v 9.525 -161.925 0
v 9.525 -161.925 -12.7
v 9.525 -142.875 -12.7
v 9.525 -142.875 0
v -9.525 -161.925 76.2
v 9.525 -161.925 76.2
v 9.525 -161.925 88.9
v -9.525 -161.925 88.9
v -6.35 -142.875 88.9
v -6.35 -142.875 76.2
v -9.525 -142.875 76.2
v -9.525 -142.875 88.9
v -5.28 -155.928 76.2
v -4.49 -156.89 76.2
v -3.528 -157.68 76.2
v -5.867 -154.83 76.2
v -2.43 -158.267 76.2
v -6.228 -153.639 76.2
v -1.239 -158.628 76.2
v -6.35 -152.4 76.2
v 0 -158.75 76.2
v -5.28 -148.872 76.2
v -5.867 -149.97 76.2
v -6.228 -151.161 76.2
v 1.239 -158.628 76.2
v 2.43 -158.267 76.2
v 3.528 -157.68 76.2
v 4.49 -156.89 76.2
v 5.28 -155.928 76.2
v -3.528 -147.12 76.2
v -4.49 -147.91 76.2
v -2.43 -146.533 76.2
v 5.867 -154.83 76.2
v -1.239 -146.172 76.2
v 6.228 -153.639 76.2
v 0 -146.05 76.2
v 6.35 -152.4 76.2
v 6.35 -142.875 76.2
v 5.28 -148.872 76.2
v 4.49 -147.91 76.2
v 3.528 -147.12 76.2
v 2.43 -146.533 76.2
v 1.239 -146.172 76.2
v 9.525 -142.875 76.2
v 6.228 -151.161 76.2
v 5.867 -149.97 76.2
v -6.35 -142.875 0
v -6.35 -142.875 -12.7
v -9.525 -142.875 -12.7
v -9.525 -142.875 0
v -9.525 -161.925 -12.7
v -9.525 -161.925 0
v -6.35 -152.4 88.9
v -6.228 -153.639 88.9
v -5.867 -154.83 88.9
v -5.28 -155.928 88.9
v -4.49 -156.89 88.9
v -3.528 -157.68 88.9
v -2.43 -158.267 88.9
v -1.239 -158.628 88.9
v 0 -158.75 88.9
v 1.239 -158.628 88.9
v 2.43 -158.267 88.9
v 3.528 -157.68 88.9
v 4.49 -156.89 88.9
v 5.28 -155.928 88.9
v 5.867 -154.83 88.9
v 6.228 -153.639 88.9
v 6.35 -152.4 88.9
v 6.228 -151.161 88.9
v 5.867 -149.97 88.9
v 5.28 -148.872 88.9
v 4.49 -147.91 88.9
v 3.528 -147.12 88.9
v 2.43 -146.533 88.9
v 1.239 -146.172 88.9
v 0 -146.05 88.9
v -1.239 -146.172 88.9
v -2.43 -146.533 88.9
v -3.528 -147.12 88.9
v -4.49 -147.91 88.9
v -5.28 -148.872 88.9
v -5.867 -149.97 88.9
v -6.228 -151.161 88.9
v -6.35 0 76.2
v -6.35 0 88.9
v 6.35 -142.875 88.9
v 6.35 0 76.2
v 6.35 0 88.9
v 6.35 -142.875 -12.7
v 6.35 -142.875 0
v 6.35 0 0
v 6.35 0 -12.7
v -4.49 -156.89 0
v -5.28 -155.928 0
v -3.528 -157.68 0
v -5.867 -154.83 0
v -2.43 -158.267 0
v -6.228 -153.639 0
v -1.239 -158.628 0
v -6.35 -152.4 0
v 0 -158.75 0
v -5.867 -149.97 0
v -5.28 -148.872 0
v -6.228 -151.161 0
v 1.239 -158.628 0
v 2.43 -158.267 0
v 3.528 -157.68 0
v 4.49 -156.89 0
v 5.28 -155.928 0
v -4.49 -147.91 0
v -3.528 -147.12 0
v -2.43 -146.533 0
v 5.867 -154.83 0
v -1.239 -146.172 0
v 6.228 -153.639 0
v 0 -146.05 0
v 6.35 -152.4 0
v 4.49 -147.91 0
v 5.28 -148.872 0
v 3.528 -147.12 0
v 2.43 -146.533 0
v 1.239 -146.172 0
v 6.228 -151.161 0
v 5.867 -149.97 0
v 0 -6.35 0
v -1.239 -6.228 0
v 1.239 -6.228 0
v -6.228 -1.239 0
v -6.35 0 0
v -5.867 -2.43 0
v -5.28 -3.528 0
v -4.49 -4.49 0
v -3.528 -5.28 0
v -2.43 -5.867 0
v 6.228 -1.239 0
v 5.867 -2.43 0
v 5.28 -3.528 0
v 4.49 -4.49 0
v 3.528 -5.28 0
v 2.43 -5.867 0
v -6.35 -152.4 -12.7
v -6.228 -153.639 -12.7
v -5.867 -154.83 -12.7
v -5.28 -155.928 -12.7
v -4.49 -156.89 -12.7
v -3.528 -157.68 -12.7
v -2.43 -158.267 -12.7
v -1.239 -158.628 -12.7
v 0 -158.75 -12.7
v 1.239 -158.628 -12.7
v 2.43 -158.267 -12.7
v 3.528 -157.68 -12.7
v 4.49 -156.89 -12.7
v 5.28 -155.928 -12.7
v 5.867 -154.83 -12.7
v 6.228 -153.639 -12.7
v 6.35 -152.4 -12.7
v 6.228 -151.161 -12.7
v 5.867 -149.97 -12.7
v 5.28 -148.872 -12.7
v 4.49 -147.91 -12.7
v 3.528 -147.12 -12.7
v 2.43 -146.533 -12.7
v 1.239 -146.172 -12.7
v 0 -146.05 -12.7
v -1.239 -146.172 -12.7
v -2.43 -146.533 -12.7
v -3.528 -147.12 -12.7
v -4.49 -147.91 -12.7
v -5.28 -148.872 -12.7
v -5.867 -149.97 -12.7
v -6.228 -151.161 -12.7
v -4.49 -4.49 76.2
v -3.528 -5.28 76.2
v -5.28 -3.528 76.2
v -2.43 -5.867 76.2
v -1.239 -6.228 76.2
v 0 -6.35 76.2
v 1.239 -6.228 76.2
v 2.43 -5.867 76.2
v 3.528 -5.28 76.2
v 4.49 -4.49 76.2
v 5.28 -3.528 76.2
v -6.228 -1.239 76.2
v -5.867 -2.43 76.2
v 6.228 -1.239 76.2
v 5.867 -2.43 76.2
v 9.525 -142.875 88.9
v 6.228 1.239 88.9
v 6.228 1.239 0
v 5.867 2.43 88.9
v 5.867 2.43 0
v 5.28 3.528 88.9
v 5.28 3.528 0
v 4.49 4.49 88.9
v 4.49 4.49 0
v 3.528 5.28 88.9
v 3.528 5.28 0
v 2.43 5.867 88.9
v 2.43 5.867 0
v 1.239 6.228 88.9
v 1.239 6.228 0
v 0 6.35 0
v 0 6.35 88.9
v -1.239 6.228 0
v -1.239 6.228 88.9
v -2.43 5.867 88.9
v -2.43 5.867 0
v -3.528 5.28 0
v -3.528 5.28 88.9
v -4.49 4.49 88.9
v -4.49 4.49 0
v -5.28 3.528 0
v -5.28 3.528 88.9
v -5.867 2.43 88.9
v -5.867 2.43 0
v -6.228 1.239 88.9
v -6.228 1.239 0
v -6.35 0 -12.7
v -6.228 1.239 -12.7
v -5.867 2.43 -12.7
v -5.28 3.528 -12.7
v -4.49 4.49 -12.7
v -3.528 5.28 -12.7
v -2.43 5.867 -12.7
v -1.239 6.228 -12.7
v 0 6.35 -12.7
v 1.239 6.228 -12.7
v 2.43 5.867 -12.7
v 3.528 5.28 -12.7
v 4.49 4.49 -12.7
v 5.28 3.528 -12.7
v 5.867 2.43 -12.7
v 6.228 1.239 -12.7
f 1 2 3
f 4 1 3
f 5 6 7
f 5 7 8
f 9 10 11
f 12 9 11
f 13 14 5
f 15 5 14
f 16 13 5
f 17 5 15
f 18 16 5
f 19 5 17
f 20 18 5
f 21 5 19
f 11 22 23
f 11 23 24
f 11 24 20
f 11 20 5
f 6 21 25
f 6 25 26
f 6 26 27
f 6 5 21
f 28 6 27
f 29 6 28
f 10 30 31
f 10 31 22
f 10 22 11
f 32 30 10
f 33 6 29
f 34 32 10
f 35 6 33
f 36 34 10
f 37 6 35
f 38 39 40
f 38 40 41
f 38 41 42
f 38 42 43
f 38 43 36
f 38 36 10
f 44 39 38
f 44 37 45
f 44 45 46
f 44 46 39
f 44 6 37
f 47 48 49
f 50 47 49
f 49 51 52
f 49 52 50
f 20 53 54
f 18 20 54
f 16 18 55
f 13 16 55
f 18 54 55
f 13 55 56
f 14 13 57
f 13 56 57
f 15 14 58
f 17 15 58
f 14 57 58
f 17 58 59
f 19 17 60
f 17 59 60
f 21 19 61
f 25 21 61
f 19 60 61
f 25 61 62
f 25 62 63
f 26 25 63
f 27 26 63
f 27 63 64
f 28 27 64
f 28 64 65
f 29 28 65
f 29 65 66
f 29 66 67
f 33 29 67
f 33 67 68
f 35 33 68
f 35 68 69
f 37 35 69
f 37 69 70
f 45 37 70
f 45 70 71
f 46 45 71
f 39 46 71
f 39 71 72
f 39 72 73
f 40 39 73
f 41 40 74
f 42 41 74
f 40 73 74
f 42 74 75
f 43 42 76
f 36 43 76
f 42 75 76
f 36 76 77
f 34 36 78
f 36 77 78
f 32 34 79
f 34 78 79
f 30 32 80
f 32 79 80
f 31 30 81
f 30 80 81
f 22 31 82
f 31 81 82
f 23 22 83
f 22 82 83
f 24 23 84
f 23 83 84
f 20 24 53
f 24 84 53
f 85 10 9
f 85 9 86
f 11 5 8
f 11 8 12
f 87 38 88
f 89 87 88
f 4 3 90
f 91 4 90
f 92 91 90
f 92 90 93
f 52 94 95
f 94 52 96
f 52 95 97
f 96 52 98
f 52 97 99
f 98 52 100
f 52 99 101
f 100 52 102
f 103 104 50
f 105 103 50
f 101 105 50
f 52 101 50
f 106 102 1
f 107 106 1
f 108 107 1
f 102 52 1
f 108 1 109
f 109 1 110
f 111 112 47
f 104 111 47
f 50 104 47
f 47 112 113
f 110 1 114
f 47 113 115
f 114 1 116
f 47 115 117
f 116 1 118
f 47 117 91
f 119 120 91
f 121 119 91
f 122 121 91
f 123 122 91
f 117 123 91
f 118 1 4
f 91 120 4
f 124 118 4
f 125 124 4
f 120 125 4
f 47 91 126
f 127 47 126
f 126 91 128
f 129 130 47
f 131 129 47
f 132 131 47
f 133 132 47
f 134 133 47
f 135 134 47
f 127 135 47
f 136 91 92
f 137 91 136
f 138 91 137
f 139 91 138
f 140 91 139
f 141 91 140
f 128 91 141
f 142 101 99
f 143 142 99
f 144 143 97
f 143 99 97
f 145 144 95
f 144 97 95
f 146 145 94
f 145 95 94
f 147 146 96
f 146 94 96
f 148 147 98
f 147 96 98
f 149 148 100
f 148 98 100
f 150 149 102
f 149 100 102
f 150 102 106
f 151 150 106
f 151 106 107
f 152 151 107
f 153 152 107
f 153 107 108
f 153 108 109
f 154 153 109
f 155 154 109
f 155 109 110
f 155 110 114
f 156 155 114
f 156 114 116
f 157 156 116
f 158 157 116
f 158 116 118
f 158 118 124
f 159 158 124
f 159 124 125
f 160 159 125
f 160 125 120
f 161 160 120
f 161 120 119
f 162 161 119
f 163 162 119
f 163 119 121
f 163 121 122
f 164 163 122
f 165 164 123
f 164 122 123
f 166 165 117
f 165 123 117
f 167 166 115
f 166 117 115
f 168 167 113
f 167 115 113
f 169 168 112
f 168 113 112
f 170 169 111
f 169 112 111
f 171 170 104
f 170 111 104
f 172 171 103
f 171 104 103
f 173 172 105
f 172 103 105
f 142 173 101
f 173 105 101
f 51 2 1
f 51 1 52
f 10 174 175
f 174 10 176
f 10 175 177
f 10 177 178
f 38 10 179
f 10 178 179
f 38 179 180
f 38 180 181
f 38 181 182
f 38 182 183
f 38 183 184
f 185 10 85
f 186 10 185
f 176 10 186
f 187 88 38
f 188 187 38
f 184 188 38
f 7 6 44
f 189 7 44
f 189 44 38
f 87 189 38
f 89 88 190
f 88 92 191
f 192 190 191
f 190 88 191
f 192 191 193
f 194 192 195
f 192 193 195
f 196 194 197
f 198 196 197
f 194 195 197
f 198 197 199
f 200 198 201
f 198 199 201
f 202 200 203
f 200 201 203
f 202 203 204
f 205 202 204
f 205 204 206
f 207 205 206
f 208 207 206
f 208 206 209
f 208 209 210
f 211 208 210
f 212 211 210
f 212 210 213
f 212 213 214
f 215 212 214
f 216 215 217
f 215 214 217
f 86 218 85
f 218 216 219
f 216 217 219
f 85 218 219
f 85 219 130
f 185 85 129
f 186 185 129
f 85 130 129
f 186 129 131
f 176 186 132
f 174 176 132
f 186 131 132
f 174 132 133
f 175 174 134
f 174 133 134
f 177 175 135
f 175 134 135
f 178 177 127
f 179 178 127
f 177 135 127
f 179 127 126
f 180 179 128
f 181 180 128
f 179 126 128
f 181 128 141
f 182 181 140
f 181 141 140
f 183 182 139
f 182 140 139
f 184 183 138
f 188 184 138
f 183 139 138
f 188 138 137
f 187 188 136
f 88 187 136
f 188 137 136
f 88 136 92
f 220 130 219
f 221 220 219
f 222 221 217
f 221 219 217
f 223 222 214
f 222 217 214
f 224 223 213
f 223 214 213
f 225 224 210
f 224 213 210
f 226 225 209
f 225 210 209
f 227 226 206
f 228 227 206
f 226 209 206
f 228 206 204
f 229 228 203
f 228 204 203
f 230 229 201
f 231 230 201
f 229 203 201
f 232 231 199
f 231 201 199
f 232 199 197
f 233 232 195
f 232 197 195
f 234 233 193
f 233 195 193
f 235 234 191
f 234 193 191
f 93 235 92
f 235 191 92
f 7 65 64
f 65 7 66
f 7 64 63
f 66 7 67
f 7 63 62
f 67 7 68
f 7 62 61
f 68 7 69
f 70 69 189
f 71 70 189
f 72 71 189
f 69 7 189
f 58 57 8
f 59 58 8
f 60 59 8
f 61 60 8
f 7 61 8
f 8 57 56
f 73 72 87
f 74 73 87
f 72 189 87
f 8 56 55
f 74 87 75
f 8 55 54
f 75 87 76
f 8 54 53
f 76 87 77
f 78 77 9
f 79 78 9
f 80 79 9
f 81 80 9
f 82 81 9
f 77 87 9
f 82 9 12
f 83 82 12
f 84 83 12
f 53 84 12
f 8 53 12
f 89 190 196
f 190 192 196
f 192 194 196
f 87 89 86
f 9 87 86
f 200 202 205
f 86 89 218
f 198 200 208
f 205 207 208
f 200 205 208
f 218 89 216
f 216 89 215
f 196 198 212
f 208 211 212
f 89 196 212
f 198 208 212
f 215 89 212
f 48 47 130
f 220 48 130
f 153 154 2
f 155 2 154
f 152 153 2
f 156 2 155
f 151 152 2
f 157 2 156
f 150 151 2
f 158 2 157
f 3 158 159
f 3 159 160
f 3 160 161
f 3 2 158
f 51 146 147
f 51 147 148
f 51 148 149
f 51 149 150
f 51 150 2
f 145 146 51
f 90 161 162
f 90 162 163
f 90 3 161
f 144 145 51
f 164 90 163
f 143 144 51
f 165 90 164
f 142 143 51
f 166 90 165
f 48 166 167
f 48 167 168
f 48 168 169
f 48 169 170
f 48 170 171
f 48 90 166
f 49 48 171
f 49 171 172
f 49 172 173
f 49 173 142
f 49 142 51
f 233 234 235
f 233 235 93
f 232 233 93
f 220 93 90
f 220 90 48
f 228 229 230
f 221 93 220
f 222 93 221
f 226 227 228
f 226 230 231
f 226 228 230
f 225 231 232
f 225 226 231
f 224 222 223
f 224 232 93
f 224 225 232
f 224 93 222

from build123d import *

# Parameters (mm, degrees)
SKETCH2_R           = 6.35
BOSS_EXTRUDE1_DEPTH = 76.2
SKETCH3_W           = 12.7
SKETCH3_H           = 152.4
BOSS_EXTRUDE2_DEPTH = 12.7
BOSS_EXTRUDE3_DEPTH = 12.7
SKETCH6_W           = 12.7
SKETCH6_H           = 152.4
BOSS_EXTRUDE4_DEPTH = 12.7
BOSS_EXTRUDE5_DEPTH = 12.7
SKETCH8_W           = 19.05
SKETCH8_H           = 19.05
BOSS_EXTRUDE6_DEPTH = 101.6
SKETCH9_W           = 76.2
SKETCH9_H           = 29.319846112
CUT_EXTRUDE1_DEPTH  = 198.12
CUT_EXTRUDE2_DEPTH  = 102.6


with BuildPart() as part:
    # Sketch2 → Boss-Extrude1 (new body)
    with BuildSketch(Plane.XY):
        Circle(SKETCH2_R)
    extrude(amount=BOSS_EXTRUDE1_DEPTH)

    # Sketch3 → Boss-Extrude2 (add)
    with BuildSketch(Plane.XY.offset(76.2)):
        with Locations((0, -76.2)):
            Rectangle(SKETCH3_W, SKETCH3_H)
    extrude(amount=BOSS_EXTRUDE2_DEPTH)

    # Sketch4 → Boss-Extrude3 (add)
    with BuildSketch(Plane.XY.offset(76.2)):
        with BuildLine():
            Line((-6.35, 0), (6.35, 0))
            ThreePointArc((6.35, 0), (0, 6.35), (-6.35, 0))
        make_face()
    extrude(amount=BOSS_EXTRUDE3_DEPTH)

    # Sketch6 → Boss-Extrude4 (add)
    with BuildSketch(Plane(origin=(0, 0, 0), x_dir=(-1, 0, 0), z_dir=(0, 0, -1))):
        with Locations((0, -76.2)):
            Rectangle(SKETCH6_W, SKETCH6_H)
    extrude(amount=BOSS_EXTRUDE4_DEPTH)

    # Sketch7 → Boss-Extrude5 (add)
    with BuildSketch(Plane(origin=(0, 0, 0), x_dir=(-1, 0, 0), z_dir=(0, 0, -1))):
        with BuildLine():
            Line((-6.35, 0), (6.35, 0))
            ThreePointArc((6.35, 0), (0, 6.35), (-6.35, 0))
        make_face()
    extrude(amount=BOSS_EXTRUDE5_DEPTH)

    # Sketch8 → Boss-Extrude6 (add)
    with BuildSketch(Plane(origin=(0, 0, -12.7), x_dir=(-1, 0, 0), z_dir=(0, 0, -1))):
        with Locations((0, -152.4)):
            Rectangle(SKETCH8_W, SKETCH8_H)
    extrude(amount=-BOSS_EXTRUDE6_DEPTH)

    # Sketch9 → Cut-Extrude1 (cut)
    with BuildSketch(Plane(origin=(9.525, 0, 0), x_dir=(0, 0, -1), z_dir=(1, 0, 0))):
        with Locations((-38.1, -157.534923056)):
            Rectangle(SKETCH9_W, SKETCH9_H)
    extrude(amount=-CUT_EXTRUDE1_DEPTH, mode=Mode.SUBTRACT)

    # Sketch10 → Cut-Extrude2 (cut, through all)
    with BuildSketch(Plane.XY.offset(88.9)):
        with BuildLine():
            ThreePointArc((6.35, -152.4), (0, -146.05), (-6.35, -152.4))
            Line((-6.35, -152.4), (6.35, -152.4))
        make_face()
        with BuildLine():
            Line((6.35, -152.4), (-6.35, -152.4))
            ThreePointArc((-6.35, -152.4), (0, -158.75), (6.35, -152.4))
        make_face()
    extrude(amount=-CUT_EXTRUDE2_DEPTH, mode=Mode.SUBTRACT)


solid = part.part
